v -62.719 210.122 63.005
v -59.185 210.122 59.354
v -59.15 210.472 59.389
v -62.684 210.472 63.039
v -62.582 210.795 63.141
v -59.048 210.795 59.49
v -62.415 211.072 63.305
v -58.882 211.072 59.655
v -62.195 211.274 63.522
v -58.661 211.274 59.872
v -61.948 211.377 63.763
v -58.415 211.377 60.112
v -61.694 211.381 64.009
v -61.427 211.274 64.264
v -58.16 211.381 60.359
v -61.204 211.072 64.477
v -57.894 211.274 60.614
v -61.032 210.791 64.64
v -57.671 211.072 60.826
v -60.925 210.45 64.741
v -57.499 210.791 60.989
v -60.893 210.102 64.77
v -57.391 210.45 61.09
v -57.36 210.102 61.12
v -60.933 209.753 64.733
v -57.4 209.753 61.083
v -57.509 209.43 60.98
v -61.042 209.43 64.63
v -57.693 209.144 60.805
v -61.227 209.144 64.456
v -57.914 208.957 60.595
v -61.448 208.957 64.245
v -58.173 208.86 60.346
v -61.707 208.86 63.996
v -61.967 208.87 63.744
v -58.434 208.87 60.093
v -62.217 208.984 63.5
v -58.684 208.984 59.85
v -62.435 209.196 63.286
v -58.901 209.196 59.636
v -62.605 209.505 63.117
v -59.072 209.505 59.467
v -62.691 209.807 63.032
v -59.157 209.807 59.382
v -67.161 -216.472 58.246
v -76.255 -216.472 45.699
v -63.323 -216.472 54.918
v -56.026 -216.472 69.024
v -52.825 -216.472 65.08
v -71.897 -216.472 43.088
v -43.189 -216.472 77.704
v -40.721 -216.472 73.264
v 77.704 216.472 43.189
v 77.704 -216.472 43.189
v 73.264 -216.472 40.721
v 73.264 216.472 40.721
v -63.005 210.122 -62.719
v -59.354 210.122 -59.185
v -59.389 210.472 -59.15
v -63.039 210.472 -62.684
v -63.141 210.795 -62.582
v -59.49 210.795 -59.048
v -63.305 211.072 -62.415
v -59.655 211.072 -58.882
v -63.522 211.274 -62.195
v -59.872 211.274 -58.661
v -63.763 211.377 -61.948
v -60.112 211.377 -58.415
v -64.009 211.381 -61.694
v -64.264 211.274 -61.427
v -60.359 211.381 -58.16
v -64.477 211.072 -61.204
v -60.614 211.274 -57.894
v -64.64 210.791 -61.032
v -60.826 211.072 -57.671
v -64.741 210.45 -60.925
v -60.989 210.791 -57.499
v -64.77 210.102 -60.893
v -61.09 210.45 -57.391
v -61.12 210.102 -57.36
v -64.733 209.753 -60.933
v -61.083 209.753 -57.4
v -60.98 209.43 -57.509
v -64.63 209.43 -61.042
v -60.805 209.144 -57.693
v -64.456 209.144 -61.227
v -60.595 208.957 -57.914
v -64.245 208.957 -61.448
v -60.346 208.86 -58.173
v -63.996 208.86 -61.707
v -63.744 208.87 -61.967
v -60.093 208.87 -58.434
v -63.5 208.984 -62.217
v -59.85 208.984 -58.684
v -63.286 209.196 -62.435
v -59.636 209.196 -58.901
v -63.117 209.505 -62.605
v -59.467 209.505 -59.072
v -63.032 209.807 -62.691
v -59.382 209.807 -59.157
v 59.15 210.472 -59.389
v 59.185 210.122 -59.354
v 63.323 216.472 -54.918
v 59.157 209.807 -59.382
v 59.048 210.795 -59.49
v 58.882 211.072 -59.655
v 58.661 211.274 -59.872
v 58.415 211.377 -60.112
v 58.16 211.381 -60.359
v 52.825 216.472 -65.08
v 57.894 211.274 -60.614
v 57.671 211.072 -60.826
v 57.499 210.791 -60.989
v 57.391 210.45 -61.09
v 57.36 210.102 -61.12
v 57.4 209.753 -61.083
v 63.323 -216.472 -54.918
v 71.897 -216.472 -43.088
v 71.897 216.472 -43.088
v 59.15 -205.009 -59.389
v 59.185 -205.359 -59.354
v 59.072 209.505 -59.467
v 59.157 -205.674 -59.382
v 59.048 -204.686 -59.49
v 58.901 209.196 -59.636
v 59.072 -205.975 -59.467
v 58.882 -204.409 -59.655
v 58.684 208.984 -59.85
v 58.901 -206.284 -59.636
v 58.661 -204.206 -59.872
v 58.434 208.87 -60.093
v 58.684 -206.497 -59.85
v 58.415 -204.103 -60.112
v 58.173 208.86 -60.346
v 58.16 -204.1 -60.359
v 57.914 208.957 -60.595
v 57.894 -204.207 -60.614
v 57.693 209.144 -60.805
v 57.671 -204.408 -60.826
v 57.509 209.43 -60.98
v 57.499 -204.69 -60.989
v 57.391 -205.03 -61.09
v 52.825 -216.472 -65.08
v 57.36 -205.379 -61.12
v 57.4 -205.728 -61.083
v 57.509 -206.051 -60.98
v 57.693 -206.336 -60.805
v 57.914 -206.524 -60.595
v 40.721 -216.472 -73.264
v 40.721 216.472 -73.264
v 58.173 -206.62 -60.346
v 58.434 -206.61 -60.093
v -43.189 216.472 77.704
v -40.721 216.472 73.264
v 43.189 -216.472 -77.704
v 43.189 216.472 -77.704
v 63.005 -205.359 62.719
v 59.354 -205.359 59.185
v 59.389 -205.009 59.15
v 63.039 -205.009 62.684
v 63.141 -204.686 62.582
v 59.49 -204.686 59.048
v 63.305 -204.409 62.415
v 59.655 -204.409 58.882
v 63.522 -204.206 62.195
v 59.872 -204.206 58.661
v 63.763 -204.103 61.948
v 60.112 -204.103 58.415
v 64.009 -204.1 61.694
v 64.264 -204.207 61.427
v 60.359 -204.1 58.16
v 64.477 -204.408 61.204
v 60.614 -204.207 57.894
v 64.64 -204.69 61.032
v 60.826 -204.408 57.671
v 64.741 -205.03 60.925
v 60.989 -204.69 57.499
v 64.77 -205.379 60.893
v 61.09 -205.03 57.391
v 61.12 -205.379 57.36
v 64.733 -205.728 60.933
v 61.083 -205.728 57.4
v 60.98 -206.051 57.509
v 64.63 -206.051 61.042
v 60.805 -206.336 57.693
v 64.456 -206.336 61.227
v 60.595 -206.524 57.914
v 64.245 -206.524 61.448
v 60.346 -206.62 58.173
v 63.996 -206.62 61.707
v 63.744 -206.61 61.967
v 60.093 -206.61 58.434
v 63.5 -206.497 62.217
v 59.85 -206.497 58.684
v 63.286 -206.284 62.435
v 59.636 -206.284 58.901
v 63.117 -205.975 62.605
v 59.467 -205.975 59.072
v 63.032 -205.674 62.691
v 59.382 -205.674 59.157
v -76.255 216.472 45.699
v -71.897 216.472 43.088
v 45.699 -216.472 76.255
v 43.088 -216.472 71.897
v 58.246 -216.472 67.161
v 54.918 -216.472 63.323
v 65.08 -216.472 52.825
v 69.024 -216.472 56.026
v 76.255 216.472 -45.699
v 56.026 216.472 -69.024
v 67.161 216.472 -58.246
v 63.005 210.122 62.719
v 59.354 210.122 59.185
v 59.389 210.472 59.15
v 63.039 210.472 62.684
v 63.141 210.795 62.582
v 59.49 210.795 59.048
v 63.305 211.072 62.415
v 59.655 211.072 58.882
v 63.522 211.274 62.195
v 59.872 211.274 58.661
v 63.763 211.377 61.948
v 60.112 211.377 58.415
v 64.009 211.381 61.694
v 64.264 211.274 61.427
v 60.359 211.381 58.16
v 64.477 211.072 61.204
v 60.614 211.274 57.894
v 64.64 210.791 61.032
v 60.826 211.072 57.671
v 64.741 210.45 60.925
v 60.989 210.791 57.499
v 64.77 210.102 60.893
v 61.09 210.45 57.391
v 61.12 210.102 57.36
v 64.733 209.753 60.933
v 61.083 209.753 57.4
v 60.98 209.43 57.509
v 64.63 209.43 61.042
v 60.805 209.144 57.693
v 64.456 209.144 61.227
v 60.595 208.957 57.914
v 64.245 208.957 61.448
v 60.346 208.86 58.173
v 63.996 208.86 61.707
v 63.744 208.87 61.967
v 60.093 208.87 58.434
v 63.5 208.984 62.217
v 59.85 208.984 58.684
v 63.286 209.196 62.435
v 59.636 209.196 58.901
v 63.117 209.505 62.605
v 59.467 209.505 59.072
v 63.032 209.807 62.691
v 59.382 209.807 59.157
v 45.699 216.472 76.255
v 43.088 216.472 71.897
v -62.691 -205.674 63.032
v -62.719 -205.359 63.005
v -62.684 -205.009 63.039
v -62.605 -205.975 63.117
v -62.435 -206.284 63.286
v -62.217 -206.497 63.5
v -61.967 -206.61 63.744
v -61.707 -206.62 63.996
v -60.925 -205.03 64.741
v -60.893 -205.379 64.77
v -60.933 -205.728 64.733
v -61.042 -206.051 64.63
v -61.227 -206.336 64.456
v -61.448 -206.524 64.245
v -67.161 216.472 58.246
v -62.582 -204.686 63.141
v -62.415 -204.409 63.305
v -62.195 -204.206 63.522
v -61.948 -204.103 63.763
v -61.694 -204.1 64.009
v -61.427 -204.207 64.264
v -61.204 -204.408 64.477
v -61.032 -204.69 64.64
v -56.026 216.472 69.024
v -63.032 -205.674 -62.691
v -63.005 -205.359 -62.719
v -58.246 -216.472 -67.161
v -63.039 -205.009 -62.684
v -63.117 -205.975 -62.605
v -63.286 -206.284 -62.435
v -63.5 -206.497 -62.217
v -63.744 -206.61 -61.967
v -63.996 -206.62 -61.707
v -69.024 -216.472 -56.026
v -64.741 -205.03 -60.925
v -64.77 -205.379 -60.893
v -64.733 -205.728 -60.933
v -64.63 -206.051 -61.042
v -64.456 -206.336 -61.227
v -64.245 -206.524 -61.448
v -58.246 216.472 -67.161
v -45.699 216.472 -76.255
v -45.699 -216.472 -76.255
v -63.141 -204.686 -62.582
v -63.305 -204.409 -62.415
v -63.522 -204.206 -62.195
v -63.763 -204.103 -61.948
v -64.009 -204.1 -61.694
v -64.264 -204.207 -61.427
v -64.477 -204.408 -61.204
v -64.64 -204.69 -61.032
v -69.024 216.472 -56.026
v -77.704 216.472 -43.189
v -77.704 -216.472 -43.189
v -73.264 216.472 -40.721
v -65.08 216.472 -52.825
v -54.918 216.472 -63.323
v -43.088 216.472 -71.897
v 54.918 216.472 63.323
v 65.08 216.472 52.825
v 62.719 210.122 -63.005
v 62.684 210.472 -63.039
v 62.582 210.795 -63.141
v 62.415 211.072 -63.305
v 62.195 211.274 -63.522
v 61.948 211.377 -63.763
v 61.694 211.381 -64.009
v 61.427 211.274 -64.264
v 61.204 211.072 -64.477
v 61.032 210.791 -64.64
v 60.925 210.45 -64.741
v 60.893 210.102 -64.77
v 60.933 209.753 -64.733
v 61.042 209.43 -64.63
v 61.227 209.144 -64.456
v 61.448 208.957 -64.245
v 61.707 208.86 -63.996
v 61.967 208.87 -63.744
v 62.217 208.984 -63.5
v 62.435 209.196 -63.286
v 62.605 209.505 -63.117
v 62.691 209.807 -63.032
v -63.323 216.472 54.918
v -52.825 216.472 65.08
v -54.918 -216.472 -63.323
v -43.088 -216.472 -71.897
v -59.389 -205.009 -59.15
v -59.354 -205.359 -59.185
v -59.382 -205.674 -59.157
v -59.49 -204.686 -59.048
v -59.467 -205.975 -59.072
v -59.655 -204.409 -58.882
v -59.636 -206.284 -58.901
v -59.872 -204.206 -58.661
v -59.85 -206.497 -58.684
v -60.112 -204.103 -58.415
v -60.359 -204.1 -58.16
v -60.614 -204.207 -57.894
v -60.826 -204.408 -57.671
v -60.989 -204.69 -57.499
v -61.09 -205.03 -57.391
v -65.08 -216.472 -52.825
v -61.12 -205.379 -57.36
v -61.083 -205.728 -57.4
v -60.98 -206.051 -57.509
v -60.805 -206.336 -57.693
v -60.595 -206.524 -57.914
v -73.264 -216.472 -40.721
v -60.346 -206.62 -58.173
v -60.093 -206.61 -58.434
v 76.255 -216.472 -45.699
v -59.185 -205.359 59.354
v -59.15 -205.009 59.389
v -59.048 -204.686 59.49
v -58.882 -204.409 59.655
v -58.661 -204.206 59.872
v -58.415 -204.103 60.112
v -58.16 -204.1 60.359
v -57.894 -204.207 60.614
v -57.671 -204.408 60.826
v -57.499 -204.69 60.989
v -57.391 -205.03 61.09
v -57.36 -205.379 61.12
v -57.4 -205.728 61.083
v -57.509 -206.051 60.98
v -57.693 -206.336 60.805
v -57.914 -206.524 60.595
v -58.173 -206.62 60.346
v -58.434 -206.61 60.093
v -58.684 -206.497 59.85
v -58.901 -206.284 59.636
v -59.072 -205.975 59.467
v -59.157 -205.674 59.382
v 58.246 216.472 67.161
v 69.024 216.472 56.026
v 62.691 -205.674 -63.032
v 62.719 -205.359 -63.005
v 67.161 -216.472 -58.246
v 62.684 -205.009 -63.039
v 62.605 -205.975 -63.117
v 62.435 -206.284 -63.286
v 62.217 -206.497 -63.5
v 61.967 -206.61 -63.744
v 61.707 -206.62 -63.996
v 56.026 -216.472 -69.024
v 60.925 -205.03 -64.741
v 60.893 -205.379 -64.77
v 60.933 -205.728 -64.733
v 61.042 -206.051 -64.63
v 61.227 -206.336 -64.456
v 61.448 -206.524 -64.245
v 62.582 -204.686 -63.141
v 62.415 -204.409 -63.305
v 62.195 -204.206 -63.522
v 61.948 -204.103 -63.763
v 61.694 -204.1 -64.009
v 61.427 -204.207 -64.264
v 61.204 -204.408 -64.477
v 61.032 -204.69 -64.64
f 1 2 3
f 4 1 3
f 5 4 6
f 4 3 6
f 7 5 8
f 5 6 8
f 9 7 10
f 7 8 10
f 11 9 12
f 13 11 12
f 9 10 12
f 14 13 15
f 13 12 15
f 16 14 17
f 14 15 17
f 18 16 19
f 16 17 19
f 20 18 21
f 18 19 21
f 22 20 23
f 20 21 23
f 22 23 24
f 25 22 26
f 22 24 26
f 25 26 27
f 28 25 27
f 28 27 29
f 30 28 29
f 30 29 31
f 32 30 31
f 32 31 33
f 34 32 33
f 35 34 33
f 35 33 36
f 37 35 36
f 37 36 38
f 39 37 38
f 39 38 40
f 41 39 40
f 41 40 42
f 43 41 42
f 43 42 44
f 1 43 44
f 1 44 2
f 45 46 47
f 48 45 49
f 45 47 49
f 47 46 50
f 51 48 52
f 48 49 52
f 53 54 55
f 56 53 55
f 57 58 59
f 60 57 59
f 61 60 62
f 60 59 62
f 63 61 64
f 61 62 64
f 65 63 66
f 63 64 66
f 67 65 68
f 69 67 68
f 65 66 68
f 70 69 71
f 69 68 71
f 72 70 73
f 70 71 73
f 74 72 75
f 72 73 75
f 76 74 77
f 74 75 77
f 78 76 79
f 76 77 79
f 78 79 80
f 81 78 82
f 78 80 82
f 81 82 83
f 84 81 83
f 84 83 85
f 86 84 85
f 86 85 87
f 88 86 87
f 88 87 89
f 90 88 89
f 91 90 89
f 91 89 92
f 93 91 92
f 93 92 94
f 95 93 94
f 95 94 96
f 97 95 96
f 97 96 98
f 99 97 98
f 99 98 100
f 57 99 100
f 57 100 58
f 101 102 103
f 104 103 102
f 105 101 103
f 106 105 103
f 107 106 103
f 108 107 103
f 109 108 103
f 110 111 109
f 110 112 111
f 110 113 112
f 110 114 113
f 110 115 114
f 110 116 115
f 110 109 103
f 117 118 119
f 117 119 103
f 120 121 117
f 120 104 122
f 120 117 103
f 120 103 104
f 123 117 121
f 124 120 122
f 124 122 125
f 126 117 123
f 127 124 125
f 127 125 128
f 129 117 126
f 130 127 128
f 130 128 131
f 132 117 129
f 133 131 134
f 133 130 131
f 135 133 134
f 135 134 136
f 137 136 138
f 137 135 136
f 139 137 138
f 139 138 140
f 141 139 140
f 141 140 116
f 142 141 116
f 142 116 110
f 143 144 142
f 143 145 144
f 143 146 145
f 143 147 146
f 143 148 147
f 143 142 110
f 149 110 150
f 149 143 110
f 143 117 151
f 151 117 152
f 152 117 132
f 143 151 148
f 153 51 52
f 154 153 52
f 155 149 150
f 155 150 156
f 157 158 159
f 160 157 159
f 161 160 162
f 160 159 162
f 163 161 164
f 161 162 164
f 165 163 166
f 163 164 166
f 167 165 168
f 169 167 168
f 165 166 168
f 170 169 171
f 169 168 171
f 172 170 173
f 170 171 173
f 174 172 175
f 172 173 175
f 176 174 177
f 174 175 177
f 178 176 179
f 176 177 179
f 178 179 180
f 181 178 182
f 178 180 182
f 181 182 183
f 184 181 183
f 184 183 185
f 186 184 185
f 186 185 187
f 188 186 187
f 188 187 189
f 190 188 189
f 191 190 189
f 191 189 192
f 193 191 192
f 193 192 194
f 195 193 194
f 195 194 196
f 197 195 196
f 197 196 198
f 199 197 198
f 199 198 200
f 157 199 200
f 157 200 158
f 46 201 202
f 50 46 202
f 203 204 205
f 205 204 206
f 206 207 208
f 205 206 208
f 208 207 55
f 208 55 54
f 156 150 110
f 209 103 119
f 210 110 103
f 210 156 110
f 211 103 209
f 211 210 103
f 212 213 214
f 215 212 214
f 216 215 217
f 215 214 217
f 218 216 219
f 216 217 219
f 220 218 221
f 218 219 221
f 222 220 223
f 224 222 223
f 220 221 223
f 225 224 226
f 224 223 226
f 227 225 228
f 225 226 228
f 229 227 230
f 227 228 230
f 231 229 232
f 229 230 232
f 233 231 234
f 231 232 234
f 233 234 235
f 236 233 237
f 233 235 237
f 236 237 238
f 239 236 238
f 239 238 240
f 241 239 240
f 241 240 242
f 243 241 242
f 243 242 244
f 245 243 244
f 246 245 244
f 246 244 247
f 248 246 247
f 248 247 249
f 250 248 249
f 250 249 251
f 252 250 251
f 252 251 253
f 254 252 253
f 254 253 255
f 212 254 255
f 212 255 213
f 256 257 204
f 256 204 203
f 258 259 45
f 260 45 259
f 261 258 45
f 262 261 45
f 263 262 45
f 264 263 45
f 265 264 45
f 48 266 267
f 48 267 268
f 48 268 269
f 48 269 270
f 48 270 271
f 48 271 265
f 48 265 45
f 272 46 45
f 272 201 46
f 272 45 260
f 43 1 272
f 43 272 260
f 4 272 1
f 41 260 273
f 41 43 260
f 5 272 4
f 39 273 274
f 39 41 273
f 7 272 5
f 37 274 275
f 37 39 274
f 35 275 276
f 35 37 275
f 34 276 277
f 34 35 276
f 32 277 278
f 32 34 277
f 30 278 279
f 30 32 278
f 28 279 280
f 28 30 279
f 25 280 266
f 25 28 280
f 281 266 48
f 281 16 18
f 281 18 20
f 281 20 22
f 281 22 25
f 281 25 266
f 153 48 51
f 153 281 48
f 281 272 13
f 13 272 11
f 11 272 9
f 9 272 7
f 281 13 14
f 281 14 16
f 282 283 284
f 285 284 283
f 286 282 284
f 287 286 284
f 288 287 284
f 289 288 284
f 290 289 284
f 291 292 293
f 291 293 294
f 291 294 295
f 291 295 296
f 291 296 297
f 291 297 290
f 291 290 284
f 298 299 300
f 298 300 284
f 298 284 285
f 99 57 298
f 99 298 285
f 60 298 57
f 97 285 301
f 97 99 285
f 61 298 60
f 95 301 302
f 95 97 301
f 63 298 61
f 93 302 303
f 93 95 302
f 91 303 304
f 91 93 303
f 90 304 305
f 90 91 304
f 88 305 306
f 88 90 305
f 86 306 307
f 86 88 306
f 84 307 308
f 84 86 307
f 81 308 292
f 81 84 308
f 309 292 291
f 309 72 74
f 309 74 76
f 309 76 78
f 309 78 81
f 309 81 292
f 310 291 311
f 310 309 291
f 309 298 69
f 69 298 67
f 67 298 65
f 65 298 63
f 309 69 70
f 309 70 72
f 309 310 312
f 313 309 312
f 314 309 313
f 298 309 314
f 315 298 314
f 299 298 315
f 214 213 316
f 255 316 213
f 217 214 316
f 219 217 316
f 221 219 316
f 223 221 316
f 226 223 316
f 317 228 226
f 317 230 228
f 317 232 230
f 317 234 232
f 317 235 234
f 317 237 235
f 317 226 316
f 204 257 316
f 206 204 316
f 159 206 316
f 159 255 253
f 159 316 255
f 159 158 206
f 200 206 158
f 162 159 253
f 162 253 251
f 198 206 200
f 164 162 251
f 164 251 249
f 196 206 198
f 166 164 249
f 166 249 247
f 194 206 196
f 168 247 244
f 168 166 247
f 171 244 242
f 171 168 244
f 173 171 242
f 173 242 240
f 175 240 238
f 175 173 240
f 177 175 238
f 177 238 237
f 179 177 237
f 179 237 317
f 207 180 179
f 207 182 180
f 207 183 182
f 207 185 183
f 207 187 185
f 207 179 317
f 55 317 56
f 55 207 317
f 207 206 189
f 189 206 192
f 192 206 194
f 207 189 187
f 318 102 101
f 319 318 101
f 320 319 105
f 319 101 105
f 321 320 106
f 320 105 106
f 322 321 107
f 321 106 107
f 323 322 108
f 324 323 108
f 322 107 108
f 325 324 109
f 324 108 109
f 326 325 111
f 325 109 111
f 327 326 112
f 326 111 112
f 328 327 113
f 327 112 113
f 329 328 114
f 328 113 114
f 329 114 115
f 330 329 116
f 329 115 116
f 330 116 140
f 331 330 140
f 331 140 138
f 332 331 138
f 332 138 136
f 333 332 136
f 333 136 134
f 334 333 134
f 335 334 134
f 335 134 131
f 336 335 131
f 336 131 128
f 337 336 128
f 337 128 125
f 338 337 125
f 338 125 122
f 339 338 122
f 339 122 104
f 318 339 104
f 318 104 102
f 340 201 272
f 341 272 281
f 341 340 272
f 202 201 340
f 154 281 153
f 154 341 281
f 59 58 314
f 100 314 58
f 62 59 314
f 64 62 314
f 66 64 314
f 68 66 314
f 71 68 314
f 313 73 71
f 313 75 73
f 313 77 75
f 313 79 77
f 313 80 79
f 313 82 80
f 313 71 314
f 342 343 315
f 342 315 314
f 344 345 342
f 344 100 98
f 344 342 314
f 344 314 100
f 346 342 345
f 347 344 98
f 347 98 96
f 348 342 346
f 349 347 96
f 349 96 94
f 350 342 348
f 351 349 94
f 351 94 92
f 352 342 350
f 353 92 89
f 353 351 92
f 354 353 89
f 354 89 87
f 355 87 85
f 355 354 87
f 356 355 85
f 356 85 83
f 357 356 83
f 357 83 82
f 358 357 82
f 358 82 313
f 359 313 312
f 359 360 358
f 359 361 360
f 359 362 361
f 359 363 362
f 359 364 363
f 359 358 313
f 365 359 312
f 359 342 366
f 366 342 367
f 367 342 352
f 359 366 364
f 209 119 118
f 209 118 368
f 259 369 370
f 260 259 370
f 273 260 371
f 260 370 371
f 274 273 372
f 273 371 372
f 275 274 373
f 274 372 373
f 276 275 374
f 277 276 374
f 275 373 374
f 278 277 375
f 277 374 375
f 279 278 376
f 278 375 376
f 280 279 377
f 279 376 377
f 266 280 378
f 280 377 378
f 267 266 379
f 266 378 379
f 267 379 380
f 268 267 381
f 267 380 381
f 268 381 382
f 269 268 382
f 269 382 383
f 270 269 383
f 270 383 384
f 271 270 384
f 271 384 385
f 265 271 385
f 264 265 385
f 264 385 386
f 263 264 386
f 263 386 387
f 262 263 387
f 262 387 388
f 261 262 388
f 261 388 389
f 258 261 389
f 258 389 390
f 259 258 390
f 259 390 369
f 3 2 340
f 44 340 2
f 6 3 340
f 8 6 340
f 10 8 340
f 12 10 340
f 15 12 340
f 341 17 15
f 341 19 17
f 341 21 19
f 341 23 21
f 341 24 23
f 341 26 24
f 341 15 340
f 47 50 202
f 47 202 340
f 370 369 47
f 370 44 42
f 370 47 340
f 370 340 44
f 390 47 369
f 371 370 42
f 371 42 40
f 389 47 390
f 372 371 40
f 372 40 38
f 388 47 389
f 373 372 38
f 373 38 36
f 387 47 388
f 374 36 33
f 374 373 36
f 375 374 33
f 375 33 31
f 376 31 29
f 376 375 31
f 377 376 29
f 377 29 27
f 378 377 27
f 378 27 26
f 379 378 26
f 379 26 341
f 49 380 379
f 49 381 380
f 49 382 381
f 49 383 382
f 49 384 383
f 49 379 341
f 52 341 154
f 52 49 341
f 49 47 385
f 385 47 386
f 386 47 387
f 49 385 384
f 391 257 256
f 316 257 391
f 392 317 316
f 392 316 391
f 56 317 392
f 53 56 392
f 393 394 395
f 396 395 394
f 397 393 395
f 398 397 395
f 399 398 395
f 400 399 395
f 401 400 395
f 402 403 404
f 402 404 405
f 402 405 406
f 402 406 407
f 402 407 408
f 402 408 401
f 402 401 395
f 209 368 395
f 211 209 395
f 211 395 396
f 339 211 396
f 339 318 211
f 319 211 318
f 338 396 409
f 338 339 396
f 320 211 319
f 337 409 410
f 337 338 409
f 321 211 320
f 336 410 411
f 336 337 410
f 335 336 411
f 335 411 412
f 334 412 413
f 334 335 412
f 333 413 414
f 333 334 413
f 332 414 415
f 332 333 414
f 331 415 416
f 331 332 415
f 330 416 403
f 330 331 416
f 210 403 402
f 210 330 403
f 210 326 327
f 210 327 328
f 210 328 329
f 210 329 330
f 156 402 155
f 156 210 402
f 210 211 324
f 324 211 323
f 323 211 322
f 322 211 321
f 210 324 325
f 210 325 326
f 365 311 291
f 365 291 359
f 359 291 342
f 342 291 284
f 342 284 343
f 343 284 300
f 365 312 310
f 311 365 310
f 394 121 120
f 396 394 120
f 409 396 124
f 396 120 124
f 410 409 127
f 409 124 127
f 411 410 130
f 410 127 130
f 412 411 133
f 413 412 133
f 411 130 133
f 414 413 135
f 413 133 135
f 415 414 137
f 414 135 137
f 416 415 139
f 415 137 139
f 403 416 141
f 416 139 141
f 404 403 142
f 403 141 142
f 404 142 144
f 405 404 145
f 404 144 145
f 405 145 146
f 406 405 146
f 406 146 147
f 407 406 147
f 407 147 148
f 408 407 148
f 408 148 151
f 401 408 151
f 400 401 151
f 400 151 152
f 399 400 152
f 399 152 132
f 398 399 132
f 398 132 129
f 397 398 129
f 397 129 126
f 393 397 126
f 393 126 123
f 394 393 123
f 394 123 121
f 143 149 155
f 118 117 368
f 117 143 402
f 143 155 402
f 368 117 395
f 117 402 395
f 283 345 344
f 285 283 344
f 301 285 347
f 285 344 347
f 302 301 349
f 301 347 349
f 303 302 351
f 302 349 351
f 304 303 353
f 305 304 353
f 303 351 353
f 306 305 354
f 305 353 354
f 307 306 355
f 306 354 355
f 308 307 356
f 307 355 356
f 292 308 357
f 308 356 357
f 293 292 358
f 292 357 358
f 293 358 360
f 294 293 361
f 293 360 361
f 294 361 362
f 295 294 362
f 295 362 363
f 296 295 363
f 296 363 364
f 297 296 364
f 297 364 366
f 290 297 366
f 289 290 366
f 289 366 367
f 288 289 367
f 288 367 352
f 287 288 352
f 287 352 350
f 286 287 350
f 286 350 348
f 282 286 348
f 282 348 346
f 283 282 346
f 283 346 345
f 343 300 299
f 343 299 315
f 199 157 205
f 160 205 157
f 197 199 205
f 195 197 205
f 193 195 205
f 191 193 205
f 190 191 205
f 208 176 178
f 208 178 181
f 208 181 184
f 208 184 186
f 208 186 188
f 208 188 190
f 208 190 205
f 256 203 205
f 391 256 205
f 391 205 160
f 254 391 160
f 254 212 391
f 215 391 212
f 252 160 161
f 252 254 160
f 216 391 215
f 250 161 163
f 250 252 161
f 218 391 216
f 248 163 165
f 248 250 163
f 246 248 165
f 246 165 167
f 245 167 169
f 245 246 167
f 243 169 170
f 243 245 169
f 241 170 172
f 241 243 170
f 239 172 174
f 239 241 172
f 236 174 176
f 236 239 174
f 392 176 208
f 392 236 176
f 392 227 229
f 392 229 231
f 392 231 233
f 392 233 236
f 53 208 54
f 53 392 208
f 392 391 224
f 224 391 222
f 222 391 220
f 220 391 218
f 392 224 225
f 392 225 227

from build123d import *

# Parameters (mm, degrees)
SKETCH2_R               = 88.9
SKETCH2_R_2             = 83.82
BOSS_EXTRUDE1_DEPTH     = 216.4715
CUT_EXTRUDE1_DEPTH      = 217.4715
CUT_EXTRUDE1_DEPTH_BACK = 217.4715
SKETCH5_R               = 1.27
BOLT_HOLES_DEPTH        = 29.911624556
BOLT_PATTERN_COUNT      = 4


with BuildPart() as part:
    # Sketch2 → Boss-Extrude1 (new body, symmetric)
    with BuildSketch(Plane(origin=(0, 0, 0), x_dir=(1, 0, 0), z_dir=(0, 1, 0))):
        Circle(SKETCH2_R)
        Circle(SKETCH2_R_2, mode=Mode.SUBTRACT)
    extrude(amount=BOSS_EXTRUDE1_DEPTH, both=True)

    # Sketch3 → Cut-Extrude1 (cut, two sides)
    with BuildSketch(Plane(origin=(0, 0, 0), x_dir=(1, 0, 0), z_dir=(0, 1, 0))) as cut_extrude1_sk:
        Polygon((169.661755759, -94.300371224), (0, 0), (169.661755759, 101.677593364), align=None)
        Polygon((0, 0), (53.900027233, 96.974944394), (-58.116685864, 96.974944394), align=None)
        Polygon((-123.741299607, 68.777140945), (-123.741299607, -74.157652604), (0, 0), align=None)
        Polygon((-65.840936026, -118.45858783), (0, 0), (70.991745134, -118.45858783), align=None)
    extrude(amount=CUT_EXTRUDE1_DEPTH, mode=Mode.SUBTRACT)
    extrude(cut_extrude1_sk.sketch, amount=-CUT_EXTRUDE1_DEPTH_BACK, mode=Mode.SUBTRACT)

    # Sketch5 → Bolt holes (cut, through all)
    with BuildSketch(Plane(origin=(-56.309218645, 0, 58.175814955), x_dir=(-0.718540152, 0, -0.695485478), z_dir=(0.695485478, 0, -0.718540152))):
        with Locations((-0.02278764, 210.1215)):
            Circle(SKETCH5_R)
        with Locations((-0.02278764, -205.359)):
            Circle(SKETCH5_R)
    bolt_holes = extrude(amount=-BOLT_HOLES_DEPTH, mode=Mode.SUBTRACT)

    # Bolt pattern: Bolt holes ×4 about axis
    bolt_pattern_axis = Axis((0, 216.4715, 0), (0, 1, 0))
    for i in range(1, BOLT_PATTERN_COUNT):
        add(bolt_holes.rotate(bolt_pattern_axis, i * 360 / BOLT_PATTERN_COUNT), mode=Mode.SUBTRACT)


solid = part.part
